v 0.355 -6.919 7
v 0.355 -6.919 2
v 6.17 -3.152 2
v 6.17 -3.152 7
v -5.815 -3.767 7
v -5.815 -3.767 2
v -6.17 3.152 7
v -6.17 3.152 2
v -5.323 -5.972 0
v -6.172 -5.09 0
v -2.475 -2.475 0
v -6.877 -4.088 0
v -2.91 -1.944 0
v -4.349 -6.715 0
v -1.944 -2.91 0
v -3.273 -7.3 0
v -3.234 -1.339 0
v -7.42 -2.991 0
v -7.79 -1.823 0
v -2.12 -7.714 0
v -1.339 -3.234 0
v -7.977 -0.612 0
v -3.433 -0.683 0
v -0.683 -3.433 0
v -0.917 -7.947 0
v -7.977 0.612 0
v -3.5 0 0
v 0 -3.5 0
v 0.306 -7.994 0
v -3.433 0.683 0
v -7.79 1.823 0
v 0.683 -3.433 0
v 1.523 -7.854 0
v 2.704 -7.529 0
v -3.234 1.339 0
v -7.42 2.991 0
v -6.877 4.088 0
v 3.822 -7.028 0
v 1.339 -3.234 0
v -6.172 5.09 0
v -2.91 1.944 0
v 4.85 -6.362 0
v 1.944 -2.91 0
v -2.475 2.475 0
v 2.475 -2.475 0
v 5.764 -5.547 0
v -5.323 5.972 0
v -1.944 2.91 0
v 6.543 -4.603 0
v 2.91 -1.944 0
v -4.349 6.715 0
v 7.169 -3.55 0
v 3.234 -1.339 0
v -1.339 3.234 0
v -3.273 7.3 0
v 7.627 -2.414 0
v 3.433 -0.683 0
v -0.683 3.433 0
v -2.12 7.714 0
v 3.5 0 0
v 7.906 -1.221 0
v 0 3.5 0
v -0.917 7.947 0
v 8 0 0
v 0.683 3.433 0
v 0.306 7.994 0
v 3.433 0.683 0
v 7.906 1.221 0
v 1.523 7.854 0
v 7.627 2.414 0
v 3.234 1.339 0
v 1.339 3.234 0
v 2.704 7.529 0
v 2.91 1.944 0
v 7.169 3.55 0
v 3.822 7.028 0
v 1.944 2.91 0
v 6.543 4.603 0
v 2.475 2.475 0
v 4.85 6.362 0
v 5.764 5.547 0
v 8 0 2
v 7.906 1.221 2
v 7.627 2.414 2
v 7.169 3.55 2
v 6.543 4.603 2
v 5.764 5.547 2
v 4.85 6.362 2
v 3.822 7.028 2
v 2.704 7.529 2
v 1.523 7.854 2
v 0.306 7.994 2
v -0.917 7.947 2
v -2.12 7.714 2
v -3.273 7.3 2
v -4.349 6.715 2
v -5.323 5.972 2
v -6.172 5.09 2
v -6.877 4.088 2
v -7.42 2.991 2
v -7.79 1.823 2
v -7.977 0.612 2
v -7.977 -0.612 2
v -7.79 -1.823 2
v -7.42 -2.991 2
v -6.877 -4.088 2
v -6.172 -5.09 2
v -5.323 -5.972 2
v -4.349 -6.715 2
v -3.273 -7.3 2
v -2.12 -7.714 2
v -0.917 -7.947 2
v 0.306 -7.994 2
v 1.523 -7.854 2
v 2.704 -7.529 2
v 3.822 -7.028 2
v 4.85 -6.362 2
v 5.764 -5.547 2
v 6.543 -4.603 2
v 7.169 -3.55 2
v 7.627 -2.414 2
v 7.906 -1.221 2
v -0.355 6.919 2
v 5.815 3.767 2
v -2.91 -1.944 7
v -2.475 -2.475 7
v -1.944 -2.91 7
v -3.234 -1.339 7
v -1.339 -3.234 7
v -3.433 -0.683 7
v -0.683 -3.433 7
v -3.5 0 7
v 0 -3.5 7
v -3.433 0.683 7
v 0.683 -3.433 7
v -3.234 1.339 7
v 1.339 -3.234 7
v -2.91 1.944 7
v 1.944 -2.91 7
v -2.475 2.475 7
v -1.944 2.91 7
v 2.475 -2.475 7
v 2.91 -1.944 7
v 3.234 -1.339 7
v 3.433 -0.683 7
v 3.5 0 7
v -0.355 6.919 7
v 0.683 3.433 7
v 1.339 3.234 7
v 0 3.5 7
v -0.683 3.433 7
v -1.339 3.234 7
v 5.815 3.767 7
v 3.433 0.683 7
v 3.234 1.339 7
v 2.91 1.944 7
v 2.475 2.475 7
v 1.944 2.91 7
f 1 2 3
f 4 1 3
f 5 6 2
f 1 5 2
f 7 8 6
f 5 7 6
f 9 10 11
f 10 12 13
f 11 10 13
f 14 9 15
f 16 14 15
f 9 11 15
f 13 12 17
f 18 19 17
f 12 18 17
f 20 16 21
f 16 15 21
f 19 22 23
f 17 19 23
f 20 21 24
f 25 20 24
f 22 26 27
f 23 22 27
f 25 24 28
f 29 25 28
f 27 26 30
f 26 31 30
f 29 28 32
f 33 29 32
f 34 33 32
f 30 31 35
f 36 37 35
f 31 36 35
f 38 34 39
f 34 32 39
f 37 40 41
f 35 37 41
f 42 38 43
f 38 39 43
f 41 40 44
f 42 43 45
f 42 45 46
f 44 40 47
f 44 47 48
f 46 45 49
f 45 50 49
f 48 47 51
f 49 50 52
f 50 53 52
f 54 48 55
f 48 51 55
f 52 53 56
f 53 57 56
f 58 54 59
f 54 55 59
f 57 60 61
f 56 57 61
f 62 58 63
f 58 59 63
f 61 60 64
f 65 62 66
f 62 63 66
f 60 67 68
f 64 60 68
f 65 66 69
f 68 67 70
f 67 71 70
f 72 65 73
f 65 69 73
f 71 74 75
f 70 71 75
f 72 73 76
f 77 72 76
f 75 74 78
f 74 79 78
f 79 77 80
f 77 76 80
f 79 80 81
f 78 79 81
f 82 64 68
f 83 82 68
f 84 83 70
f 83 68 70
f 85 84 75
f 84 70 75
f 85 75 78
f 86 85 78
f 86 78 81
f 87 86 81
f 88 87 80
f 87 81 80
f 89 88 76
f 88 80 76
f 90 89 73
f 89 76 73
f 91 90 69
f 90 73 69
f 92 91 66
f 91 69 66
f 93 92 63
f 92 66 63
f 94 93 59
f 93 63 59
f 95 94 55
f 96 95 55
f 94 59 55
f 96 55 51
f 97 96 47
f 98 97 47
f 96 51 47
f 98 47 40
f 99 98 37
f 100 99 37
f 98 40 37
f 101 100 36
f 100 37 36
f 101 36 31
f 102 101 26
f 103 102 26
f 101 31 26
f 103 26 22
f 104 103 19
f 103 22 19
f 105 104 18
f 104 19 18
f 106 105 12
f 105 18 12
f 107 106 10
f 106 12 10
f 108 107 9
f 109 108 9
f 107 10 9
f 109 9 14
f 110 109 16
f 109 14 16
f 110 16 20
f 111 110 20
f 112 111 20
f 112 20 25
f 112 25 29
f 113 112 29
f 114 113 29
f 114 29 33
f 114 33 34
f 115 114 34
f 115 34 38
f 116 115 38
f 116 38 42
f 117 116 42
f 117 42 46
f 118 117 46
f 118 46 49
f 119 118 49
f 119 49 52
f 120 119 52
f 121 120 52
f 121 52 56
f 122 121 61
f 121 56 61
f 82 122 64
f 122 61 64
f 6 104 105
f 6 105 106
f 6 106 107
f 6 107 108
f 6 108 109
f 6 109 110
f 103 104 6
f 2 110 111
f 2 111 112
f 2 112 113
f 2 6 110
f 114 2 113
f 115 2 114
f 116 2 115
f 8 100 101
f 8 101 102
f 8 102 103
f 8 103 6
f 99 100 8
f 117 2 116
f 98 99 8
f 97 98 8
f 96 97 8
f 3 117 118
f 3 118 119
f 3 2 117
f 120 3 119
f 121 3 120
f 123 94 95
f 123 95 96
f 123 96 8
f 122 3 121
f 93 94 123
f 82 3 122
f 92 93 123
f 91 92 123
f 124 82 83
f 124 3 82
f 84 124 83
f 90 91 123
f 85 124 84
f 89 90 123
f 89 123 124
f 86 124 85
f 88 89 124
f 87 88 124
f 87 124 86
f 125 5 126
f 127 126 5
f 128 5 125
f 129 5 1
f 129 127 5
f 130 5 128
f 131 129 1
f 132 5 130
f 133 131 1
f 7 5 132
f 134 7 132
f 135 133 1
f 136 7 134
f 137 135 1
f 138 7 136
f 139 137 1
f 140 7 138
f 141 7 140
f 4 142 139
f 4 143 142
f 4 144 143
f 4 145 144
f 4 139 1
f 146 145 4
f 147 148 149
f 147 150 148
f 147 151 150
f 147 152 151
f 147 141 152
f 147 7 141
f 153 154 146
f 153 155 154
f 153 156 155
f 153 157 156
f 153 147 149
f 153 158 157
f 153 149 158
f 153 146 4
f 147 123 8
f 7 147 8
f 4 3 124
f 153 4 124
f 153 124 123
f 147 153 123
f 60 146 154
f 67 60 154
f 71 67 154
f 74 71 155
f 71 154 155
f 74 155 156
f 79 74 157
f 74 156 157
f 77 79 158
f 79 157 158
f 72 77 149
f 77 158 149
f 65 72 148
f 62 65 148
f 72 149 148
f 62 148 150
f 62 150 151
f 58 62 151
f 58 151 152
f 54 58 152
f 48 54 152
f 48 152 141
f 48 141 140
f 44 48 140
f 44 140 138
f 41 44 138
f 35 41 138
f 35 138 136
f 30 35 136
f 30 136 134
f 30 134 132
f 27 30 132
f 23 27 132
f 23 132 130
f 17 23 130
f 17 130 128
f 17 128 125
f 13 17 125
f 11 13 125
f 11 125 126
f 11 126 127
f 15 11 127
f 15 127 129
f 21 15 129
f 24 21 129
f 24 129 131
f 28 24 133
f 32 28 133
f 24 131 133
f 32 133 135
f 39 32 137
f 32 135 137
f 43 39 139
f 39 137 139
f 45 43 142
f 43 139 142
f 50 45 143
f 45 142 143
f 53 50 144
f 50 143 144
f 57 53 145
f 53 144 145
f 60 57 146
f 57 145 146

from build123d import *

# Parameters (mm, degrees)
F0_R     = 8
F1_DEPTH = 2
F3_DEPTH = 5
F4_R     = 3.5
F5_DEPTH = 25


with BuildPart() as f1:
    # F0 (on Top) → F1 (new body)
    with BuildSketch(Plane.XY):
        Circle(F0_R)
    extrude(amount=F1_DEPTH)

    # F2 (on face) → F3 (join)
    with BuildSketch(Plane.XY.offset(2)):
        Polygon((5.814557, 3.767084), (-0.355112, 6.919096), (-6.169669, 3.152012), (-5.814557, -3.767084), (0.355112, -6.919096), (6.169669, -3.152012), align=None)
    extrude(amount=F3_DEPTH)

    # F4 (on face) → F5 (cut)
    with BuildSketch(Plane.XY.offset(7)):
        Circle(F4_R)
    extrude(amount=-F5_DEPTH, mode=Mode.SUBTRACT)


solid = f1.part
